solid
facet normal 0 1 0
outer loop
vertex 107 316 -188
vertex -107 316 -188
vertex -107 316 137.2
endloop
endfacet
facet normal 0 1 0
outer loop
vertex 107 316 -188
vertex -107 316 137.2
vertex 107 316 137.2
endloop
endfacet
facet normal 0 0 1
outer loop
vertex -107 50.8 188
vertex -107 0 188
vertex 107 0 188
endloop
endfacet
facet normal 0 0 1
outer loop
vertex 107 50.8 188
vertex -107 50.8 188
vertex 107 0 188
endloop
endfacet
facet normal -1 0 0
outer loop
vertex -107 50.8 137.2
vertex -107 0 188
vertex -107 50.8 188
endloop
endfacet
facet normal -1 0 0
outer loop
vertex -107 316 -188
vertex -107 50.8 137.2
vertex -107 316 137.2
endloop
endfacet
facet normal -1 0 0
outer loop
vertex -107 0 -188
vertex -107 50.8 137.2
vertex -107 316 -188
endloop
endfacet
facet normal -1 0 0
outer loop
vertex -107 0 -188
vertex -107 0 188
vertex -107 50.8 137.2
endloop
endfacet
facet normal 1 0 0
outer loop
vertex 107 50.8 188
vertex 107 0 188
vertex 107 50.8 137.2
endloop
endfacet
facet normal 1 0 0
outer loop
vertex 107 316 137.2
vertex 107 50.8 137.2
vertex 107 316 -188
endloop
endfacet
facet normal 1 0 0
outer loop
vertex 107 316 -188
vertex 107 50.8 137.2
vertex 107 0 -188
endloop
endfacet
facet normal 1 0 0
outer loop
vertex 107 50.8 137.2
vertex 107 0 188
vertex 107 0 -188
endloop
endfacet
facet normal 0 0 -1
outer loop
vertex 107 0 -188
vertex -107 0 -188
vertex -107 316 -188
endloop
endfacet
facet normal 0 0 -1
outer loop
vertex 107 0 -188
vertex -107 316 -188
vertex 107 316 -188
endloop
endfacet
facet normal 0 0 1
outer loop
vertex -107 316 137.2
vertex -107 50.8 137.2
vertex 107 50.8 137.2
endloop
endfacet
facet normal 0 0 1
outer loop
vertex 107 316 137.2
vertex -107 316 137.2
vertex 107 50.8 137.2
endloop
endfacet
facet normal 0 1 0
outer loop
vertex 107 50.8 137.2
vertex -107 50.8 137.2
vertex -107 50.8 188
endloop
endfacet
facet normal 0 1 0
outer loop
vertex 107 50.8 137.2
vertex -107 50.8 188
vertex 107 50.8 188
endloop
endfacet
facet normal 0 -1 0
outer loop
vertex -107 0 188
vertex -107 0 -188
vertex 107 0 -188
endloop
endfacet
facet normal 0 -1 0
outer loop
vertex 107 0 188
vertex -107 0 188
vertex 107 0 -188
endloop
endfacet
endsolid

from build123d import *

# Parameters (mm, degrees)
SKETCH1_W           = 214
SKETCH1_H           = 376
BOSS_EXTRUDE1_DEPTH = 50.8
BOSS_EXTRUDE2_START = -50.8
SKETCH2_W           = 214
SKETCH2_H           = 325.2
BOSS_EXTRUDE2_DEPTH = 316


with BuildPart() as part:
    # Sketch1 → Boss-Extrude1 (new body)
    with BuildSketch(Plane(origin=(0, 0, 0), x_dir=(1, 0, 0), z_dir=(0, 1, 0))):
        Rectangle(SKETCH1_W, SKETCH1_H)
    extrude(amount=BOSS_EXTRUDE1_DEPTH)

    # Sketch2 → Boss-Extrude2 (add)
    with BuildSketch(Plane(origin=(0, 50.8, 0), x_dir=(1, 0, 0), z_dir=(0, 1, 0)).offset(BOSS_EXTRUDE2_START)):
        with Locations((0, 25.4)):
            Rectangle(SKETCH2_W, SKETCH2_H)
    extrude(amount=BOSS_EXTRUDE2_DEPTH)


solid = part.part
